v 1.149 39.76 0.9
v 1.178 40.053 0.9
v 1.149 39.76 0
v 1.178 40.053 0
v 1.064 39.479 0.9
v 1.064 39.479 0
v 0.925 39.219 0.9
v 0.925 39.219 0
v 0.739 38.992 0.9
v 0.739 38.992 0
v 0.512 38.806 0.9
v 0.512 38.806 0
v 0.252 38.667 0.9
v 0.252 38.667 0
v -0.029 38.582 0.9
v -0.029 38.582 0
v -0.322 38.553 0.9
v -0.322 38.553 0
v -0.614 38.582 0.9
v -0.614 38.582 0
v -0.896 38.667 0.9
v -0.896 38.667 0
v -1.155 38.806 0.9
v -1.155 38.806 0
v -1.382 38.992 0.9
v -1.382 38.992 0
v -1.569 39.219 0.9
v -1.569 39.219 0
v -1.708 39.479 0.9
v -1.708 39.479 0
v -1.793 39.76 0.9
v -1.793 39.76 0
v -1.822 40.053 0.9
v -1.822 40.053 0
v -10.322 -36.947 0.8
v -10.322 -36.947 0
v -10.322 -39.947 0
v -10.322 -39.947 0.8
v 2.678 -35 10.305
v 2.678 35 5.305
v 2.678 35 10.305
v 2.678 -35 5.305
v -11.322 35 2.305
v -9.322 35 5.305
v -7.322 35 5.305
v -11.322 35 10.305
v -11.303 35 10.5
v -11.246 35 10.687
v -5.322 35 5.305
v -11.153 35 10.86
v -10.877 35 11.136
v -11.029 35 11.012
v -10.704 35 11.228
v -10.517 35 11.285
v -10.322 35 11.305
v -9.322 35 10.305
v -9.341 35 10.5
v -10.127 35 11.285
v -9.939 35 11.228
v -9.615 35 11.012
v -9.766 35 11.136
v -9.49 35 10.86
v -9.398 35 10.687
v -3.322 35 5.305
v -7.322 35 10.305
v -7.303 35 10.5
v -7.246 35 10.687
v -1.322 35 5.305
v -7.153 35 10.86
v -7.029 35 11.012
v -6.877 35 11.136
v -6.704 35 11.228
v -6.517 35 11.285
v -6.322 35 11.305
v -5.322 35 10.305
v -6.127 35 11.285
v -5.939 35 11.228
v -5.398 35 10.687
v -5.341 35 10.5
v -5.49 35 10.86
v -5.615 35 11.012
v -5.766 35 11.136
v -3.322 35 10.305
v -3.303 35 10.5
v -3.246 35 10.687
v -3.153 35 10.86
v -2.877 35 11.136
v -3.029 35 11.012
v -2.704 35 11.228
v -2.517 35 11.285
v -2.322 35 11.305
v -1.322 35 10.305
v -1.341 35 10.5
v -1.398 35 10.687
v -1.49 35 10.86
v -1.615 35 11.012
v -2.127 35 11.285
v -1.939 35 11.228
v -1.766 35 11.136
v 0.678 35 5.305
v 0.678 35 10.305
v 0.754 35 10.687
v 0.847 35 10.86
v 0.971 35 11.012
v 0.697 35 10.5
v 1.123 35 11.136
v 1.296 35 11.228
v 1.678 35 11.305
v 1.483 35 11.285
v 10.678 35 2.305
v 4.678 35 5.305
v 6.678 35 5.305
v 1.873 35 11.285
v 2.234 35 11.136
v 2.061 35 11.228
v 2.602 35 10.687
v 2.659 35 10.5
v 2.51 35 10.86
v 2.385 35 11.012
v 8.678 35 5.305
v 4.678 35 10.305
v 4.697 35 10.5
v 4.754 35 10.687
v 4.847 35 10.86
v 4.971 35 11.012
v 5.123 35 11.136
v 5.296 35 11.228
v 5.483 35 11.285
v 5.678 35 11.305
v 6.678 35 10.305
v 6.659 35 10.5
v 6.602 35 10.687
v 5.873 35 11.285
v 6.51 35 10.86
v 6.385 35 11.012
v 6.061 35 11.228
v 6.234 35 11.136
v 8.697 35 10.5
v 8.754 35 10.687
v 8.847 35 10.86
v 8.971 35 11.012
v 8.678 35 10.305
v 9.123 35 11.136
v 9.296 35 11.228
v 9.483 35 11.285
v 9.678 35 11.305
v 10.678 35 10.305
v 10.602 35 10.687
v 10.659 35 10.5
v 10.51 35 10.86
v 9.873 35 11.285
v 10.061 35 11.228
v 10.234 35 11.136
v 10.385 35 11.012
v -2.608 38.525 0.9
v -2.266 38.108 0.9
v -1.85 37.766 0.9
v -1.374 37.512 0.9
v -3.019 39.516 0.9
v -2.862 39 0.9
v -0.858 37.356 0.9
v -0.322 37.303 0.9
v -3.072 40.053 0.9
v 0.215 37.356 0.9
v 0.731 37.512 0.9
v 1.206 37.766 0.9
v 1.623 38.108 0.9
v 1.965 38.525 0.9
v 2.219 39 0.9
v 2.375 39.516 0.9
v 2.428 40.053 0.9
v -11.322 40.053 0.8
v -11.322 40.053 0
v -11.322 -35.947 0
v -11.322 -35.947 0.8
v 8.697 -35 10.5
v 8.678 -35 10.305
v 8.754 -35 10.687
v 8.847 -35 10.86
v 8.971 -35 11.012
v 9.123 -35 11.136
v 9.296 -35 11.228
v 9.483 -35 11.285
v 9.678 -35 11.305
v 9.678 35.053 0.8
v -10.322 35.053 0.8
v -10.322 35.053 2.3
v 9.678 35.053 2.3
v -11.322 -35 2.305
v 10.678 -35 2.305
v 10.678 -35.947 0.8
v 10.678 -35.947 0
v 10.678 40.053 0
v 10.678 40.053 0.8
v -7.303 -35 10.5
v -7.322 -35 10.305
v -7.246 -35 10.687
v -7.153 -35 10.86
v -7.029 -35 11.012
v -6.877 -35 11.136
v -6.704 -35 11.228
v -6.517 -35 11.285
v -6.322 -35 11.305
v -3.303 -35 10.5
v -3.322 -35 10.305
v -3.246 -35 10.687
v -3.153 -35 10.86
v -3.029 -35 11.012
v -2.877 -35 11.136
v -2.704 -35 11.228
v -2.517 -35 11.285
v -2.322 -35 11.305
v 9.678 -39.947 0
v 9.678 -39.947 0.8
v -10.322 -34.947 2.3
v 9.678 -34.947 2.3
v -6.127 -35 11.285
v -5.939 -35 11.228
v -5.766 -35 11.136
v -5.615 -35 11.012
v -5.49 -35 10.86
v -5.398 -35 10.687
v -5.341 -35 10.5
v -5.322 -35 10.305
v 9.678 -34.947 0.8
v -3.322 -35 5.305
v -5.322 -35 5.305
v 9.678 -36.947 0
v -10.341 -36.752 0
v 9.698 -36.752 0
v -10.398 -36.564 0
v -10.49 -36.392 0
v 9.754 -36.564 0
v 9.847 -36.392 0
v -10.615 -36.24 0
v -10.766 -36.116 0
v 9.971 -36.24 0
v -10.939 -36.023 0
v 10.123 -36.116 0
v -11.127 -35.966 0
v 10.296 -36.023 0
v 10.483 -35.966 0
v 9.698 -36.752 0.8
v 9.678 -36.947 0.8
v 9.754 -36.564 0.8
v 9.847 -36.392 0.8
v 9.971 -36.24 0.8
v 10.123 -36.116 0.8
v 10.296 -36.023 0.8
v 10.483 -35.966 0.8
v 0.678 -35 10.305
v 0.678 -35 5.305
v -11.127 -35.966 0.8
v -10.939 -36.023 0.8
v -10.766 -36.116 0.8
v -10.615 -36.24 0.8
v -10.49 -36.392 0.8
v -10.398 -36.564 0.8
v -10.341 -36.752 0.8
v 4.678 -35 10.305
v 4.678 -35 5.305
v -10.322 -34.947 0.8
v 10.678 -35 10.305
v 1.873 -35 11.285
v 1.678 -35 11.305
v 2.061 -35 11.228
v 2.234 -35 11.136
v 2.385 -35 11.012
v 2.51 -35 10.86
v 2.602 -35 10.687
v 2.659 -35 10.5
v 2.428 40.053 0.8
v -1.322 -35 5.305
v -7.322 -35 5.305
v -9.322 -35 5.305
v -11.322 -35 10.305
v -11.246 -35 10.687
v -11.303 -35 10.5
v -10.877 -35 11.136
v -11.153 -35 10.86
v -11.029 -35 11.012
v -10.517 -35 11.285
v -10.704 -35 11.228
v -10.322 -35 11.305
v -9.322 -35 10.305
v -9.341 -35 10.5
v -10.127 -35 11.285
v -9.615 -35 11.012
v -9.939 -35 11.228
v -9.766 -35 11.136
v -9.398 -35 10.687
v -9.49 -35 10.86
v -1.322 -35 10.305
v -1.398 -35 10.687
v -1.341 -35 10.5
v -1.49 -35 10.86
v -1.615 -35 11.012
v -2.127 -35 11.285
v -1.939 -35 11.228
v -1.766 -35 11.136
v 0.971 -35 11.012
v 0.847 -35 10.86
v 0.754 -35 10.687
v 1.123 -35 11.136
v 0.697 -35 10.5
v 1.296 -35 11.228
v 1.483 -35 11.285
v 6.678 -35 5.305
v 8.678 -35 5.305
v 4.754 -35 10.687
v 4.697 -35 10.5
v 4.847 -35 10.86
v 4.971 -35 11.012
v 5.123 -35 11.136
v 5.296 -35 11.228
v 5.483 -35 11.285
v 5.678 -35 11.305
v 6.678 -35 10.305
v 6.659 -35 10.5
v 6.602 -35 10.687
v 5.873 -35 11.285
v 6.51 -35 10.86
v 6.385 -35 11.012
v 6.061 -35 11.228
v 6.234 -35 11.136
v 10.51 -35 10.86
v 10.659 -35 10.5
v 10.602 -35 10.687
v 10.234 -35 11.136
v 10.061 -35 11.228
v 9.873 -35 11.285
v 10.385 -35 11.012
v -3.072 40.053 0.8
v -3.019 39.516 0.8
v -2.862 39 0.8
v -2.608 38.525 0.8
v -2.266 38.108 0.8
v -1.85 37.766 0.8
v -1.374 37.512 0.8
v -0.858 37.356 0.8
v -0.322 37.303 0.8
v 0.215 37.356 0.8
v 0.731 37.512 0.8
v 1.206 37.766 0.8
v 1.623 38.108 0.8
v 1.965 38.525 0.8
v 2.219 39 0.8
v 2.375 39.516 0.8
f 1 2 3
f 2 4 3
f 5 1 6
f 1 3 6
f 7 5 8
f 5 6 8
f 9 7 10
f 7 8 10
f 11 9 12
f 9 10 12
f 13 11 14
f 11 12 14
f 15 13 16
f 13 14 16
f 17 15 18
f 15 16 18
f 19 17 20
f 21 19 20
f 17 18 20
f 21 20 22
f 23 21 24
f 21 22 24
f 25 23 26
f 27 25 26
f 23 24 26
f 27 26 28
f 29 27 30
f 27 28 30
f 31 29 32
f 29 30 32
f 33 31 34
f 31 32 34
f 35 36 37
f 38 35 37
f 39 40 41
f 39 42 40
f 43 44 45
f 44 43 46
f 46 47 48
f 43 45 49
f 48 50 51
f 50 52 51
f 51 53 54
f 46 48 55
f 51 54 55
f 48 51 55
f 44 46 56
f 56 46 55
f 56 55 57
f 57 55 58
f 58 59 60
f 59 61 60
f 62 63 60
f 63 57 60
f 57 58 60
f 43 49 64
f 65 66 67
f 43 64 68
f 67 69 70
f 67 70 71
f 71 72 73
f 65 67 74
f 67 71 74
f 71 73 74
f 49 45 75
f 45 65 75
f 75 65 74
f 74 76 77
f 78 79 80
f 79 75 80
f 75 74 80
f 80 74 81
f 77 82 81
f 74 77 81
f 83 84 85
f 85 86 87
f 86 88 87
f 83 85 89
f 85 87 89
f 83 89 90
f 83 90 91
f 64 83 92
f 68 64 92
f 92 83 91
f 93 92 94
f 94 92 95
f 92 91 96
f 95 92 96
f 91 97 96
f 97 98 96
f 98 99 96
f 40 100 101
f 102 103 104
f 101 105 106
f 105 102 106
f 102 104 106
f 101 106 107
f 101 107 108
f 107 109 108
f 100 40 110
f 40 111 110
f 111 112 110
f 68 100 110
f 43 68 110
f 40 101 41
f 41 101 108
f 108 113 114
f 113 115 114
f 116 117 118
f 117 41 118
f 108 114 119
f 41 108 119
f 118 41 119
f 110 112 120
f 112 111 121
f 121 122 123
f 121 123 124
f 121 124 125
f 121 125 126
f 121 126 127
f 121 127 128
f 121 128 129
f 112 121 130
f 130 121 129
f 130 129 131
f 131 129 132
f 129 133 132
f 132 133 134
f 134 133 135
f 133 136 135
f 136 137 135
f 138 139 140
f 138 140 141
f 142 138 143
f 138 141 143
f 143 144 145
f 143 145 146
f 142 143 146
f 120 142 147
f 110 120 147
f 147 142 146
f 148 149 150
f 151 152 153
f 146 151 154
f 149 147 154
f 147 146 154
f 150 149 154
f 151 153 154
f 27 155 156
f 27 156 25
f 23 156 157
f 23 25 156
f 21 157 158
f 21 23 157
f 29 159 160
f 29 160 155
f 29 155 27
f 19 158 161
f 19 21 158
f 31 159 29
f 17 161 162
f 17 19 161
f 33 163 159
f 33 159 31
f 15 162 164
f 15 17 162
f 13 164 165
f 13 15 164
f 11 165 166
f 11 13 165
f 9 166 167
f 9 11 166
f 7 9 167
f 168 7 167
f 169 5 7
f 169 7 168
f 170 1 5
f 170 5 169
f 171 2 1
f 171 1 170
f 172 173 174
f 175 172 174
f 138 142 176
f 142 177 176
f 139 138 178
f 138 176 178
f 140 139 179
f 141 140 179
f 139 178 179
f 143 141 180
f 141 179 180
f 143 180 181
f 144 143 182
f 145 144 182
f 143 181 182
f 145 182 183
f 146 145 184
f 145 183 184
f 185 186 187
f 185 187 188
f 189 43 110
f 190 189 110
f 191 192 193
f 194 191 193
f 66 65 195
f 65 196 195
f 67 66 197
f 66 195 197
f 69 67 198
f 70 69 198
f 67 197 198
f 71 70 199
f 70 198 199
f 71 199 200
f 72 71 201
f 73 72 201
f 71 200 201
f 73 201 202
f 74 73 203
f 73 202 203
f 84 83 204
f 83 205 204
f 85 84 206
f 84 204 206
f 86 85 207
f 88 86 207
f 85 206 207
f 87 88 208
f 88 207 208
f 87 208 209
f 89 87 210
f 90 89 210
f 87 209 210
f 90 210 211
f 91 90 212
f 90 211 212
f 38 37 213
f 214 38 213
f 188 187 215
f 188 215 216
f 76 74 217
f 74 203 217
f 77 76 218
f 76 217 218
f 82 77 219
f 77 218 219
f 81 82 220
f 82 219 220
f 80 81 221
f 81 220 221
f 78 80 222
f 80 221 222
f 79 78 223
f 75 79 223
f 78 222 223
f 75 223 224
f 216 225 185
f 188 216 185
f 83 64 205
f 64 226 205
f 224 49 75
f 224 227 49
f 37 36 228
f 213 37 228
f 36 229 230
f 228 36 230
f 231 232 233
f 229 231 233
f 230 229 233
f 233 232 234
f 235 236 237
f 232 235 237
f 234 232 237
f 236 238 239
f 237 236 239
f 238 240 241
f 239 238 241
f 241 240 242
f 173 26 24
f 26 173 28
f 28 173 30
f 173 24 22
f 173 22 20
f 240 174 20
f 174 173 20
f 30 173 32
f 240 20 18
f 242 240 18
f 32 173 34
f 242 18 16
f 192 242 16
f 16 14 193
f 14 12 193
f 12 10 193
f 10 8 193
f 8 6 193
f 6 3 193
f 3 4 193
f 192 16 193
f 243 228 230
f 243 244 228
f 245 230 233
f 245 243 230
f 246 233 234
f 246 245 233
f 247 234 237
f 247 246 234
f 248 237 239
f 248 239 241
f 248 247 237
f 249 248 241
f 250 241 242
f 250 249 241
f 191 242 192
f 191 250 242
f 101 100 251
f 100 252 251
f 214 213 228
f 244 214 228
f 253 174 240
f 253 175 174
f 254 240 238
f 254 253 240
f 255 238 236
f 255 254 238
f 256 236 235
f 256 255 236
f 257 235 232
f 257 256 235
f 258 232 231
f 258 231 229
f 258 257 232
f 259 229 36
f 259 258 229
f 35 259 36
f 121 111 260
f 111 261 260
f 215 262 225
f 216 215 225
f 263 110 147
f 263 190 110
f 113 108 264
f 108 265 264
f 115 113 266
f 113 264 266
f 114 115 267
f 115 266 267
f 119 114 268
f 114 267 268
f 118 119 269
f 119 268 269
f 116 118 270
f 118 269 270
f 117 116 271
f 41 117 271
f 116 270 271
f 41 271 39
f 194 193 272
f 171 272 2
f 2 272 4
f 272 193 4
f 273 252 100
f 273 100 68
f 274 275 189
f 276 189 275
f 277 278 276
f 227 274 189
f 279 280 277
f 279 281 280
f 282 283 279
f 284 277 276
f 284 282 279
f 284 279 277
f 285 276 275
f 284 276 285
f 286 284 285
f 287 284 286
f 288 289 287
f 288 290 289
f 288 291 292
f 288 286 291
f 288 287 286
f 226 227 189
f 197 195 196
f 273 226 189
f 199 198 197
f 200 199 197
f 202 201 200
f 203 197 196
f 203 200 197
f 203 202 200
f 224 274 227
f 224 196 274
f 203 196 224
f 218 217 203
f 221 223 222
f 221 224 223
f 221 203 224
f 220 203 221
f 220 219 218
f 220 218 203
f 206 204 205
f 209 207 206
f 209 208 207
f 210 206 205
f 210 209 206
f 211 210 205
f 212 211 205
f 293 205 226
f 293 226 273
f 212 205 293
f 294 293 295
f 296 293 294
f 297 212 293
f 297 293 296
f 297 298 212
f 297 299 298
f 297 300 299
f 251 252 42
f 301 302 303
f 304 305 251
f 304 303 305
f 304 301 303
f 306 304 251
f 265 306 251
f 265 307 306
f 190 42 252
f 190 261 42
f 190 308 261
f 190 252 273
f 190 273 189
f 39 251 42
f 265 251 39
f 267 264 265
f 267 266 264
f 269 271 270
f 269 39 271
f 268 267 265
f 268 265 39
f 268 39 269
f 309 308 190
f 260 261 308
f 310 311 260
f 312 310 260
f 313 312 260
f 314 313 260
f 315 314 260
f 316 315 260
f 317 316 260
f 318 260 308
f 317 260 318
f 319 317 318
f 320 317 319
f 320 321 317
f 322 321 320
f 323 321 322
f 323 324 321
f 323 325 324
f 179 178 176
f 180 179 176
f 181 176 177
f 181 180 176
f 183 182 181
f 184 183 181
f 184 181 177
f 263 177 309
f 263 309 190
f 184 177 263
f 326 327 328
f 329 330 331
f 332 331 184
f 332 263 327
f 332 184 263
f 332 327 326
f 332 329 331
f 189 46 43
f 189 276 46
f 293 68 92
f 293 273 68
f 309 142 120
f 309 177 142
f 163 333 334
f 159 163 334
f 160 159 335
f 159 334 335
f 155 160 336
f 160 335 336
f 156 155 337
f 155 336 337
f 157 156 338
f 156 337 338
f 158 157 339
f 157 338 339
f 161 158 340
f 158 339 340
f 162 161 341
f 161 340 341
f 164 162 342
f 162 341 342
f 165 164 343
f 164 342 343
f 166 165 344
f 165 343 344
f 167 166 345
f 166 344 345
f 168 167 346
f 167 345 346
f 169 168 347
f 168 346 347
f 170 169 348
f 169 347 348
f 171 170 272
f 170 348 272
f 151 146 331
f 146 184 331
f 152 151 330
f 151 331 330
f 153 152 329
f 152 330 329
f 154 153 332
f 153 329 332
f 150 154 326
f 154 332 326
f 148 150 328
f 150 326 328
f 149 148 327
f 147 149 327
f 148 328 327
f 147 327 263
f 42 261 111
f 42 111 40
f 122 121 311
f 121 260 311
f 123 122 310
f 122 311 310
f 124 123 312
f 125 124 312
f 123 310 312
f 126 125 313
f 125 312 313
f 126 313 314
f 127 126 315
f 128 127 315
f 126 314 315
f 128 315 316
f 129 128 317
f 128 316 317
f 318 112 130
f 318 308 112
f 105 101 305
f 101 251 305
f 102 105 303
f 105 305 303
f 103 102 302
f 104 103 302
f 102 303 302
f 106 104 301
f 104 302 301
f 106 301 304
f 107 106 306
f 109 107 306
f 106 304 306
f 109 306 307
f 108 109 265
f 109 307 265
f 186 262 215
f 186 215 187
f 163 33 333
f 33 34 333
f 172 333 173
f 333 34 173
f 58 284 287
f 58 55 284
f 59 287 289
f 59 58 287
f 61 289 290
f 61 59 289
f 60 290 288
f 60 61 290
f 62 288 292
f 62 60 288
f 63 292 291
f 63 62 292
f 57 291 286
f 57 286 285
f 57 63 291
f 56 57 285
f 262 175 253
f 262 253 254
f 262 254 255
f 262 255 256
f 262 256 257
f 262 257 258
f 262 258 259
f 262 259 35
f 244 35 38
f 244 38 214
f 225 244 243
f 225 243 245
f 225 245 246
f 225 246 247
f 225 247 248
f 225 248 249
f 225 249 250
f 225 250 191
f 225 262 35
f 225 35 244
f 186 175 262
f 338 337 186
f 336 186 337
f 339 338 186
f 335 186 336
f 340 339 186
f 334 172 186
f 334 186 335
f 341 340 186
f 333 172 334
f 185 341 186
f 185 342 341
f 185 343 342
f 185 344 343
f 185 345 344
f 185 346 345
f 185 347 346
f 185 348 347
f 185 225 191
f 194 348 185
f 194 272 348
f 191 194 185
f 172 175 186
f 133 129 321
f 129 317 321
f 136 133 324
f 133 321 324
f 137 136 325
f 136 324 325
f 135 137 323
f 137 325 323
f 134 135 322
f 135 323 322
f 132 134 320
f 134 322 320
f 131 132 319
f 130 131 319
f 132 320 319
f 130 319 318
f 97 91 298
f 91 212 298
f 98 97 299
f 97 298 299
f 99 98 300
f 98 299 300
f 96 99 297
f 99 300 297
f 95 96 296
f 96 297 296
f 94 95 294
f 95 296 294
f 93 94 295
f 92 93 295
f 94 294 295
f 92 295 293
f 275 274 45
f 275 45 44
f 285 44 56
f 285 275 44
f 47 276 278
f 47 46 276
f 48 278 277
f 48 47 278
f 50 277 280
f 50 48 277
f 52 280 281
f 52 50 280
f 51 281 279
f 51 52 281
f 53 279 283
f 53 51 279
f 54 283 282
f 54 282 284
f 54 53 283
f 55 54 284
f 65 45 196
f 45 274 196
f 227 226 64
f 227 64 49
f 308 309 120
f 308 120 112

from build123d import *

# Parameters (mm, degrees)
F1_DEPTH = 0.8
F2_R     = 0.99999
F3_W     = 20
F3_H     = 70
F4_DEPTH = 1.5
F6_DEPTH = 0.801
F7_DEPTH = 0.1
F8_W     = 1
F8_H     = 2
F8_W_2   = 2
F8_H_2   = 6
F9_DEPTH = 35
F10_R    = 0.99999


# Not quite as in the source:
# - a fillet or chamfer is up to 0.001 mm smaller than in the source, because OpenCascade refuses the exact size


with BuildPart() as f1:
    # F0 (on Top) → F1 (new body)
    with BuildSketch(Plane.XY):
        Polygon((10.6782857925, 40.0528391576), (-11.3217142075, 40.0528391576), (-11.3217142075, -35.9471608424), (-10.3217142075, -35.9471608424), (-10.3217142075, -39.9471608424), (9.6782857925, -39.9471608424), (9.6782857925, -35.9471608424), (10.6782857925, -35.9471608424), align=None)
    extrude(amount=F1_DEPTH)

    # F2 (radius 1 in the source; OpenCascade refuses exactly that, so slightly less here)
    f2_edges = [f1.edges().sort_by_distance(p)[0] for p in [
        (9.678286, -35.947161, 0.4),
        (-10.321714, -35.947161, 0.4),
    ]]
    fillet(f2_edges, radius=F2_R)

    # F3 (on face) → F4 (join)
    with BuildSketch(Plane.XY.offset(0.8)):
        with Locations((-0.3217142075, 0.0528391576)):
            Rectangle(F3_W, F3_H)
    extrude(amount=F4_DEPTH)

    # F5 (on face) → F6 (cut, through all)
    with BuildSketch(Plane.XY.offset(0.8)):
        with BuildLine():
            ThreePointArc((-1.8217142075, 40.0528391576), (-0.3217142075, 38.5528391576), (1.1782857925, 40.0528391576))
            Line((1.1782857925, 40.0528391576), (-1.8217142075, 40.0528391576))
        make_face()
    extrude(amount=-F6_DEPTH, mode=Mode.SUBTRACT)

    # F5 (on face) → F7 (join)
    with BuildSketch(Plane.XY.offset(0.8)):
        with BuildLine():
            Line((2.4282857925, 40.0528391576), (1.1782857925, 40.0528391576))
            ThreePointArc((1.1782857925, 40.0528391576), (-0.3217142075, 38.5528391576), (-1.8217142075, 40.0528391576))
            Line((-1.8217142075, 40.0528391576), (-3.0717142075, 40.0528391576))
            ThreePointArc((-3.0717142075, 40.0528391576), (-0.3217142075, 37.3028391576), (2.4282857925, 40.0528391576))
        make_face()
    extrude(amount=F7_DEPTH)


with BuildPart() as f9:
    # F8 (on Front) → F9 (new body, symmetric)
    with BuildSketch(Plane.XZ):
        Polygon((-11.321724645, 3.3045688875), (-11.321724645, 2.3045688875), (10.678275355, 2.3045688875), (10.678275355, 3.3045688875), (9.678275355, 3.3045688875), (9.678275355, 5.3045688875), (8.678275355, 5.3045688875), (6.678275355, 5.3045688875), (4.678275355, 5.3045688875), (2.678275355, 5.3045688875), (0.678275355, 5.3045688875), (-1.321724645, 5.3045688875), (-3.321724645, 5.3045688875), (-5.321724645, 5.3045688875), (-7.321724645, 5.3045688875), (-9.321724645, 5.3045688875), (-10.321724645, 5.3045688875), (-10.321724645, 3.3045688875), align=None)
        with Locations((-10.821724645, 4.3045688875)):
            Rectangle(F8_W, F8_H)
        with Locations((10.178275355, 4.3045688875)):
            Rectangle(F8_W, F8_H)
        Polygon((-11.321724645, 11.3045688875), (-11.321724645, 5.3045688875), (-10.321724645, 5.3045688875), (-9.321724645, 5.3045688875), (-9.321724645, 11.3045688875), align=None)
        Polygon((9.678275355, 5.3045688875), (10.678275355, 5.3045688875), (10.678275355, 11.3045688875), (8.678275355, 11.3045688875), (8.678275355, 5.3045688875), align=None)
        with Locations((-6.321724645, 8.3045688875)):
            Rectangle(F8_W_2, F8_H_2)
        with Locations((5.678275355, 8.3045688875)):
            Rectangle(F8_W_2, F8_H_2)
        with Locations((-2.321724645, 8.3045688875)):
            Rectangle(F8_W_2, F8_H_2)
        with Locations((1.678275355, 8.3045688875)):
            Rectangle(F8_W_2, F8_H_2)
    extrude(amount=F9_DEPTH, both=True)

    # F10 (radius 1 in the source; OpenCascade refuses exactly that, so slightly less here)
    f10_edges = [f9.edges().sort_by_distance(p)[0] for p in [
        (-11.321725, 0, 11.304569),
        (-9.321725, 0, 11.304569),
        (-7.321725, 0, 11.304569),
        (-5.321725, 0, 11.304569),
        (-3.321725, 0, 11.304569),
        (-1.321725, 0, 11.304569),
        (0.678275, 0, 11.304569),
        (2.678275, 0, 11.304569),
        (4.678275, 0, 11.304569),
        (6.678275, 0, 11.304569),
        (8.678275, 0, 11.304569),
        (10.678275, 0, 11.304569),
    ]]
    fillet(f10_edges, radius=F10_R)


solid = Compound([f1.part, f9.part])
